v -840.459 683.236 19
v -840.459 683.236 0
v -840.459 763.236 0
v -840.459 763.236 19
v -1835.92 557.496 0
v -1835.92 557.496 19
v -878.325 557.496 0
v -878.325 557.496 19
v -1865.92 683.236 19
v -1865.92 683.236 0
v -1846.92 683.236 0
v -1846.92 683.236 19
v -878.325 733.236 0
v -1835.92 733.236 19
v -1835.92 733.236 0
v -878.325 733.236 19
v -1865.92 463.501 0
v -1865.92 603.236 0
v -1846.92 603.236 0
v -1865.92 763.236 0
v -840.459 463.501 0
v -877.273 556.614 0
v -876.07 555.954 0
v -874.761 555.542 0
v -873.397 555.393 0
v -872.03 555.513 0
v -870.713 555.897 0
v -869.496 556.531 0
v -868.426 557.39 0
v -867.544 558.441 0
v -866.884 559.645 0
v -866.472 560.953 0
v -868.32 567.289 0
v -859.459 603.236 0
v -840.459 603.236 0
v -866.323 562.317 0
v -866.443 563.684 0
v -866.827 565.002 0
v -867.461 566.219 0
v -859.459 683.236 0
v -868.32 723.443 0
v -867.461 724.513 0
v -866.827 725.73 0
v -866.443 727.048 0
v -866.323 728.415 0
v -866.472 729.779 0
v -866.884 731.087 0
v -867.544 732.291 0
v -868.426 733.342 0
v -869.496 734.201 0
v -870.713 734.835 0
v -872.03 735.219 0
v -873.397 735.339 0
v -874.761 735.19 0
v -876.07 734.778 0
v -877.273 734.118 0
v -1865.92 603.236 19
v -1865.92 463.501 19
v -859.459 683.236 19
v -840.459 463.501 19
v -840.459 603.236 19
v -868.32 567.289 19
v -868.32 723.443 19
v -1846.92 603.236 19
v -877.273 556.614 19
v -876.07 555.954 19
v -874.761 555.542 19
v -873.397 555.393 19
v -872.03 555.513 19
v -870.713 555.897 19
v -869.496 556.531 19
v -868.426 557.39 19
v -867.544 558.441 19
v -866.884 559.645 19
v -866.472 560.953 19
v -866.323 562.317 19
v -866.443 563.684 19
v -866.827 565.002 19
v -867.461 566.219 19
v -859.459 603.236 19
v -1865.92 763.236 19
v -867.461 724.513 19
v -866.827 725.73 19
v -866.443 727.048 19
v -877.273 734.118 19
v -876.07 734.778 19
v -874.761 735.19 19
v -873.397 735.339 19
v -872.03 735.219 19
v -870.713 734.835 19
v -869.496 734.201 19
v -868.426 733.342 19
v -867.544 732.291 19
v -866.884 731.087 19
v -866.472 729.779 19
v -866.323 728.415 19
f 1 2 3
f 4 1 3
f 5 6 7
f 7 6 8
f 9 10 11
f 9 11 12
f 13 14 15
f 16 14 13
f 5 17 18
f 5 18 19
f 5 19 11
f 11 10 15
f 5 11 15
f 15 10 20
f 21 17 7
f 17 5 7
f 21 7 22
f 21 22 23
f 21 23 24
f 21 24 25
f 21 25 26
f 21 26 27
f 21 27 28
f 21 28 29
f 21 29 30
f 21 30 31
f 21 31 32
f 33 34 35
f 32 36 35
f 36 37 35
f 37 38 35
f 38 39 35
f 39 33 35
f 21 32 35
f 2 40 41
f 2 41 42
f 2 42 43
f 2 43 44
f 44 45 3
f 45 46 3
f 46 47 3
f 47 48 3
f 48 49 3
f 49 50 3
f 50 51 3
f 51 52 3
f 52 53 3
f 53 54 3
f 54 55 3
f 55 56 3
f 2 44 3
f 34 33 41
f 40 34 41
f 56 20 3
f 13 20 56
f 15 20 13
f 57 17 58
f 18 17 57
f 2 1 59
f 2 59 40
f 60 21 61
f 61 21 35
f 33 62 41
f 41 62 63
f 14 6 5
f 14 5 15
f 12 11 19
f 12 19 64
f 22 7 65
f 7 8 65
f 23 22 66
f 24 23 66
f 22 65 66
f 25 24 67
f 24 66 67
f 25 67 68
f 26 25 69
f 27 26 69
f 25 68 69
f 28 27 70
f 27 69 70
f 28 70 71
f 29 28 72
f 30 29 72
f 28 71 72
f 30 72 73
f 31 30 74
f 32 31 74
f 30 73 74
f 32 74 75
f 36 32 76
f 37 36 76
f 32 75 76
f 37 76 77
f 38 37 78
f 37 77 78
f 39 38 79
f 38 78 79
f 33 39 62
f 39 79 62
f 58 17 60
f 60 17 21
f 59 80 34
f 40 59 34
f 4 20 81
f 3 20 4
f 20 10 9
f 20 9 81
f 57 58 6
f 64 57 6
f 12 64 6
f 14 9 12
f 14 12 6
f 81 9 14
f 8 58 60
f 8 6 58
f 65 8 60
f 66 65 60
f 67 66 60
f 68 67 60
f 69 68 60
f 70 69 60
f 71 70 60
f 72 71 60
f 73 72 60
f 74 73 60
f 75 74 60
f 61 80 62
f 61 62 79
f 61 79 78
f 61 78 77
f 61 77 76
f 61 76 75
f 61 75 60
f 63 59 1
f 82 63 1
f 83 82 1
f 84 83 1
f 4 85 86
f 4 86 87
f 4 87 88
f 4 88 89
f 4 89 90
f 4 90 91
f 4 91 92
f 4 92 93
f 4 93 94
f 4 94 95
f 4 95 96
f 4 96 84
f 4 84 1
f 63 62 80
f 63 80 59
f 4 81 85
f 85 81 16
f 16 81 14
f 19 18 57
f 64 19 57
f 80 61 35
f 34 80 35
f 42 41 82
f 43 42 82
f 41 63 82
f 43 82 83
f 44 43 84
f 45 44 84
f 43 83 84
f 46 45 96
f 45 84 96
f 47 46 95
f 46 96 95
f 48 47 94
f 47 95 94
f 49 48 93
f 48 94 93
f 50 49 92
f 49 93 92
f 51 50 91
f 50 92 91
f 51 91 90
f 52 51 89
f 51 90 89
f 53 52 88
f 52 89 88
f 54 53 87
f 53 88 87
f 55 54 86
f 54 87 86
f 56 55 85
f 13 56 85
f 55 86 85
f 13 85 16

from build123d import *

# Parameters (mm, degrees)
SKETCH1_W           = 1025.461280364
SKETCH1_H           = 299.73488768
BOSS_EXTRUDE1_DEPTH = 19
SKETCH2_W           = 967.6
SKETCH2_H           = 175.74
CUT_EXTRUDE1_DEPTH  = 19
SKETCH3_R           = 7
CUT_EXTRUDE2_DEPTH  = 19
SKETCH5_W           = 19
SKETCH5_H           = 80
CUT_EXTRUDE3_DEPTH  = 19
SKETCH6_W           = 19
SKETCH6_H           = 80
CUT_EXTRUDE4_DEPTH  = 19


with BuildPart() as part:
    # Sketch1 → Boss-Extrude1 (new body)
    with BuildSketch(Plane.XY):
        with Locations((-1353.189241506, 613.368537441)):
            Rectangle(SKETCH1_W, SKETCH1_H)
    extrude(amount=BOSS_EXTRUDE1_DEPTH)

    # Sketch2 → Cut-Extrude1 (cut)
    with BuildSketch(Plane.XY.offset(19)):
        with Locations((-1352.119881688, 645.365981281)):
            Rectangle(SKETCH2_W, SKETCH2_H)
    extrude(amount=-CUT_EXTRUDE1_DEPTH, mode=Mode.SUBTRACT)

    # Sketch3 → Cut-Extrude2 (cut)
    with BuildSketch(Plane.XY.offset(19)):
        with Locations((-873.322364856, 728.339537454)):
            Circle(SKETCH3_R)
        with Locations((-873.322364856, 562.392425108)):
            Circle(SKETCH3_R)
    extrude(amount=-CUT_EXTRUDE2_DEPTH, mode=Mode.SUBTRACT)

    # Sketch5 → Cut-Extrude3 (cut)
    with BuildSketch(Plane(origin=(-840.458601324, 0, 0), x_dir=(0, 0, -1), z_dir=(1, 0, 0))):
        with Locations((-9.5, 643.235981281)):
            Rectangle(SKETCH5_W, SKETCH5_H)
    extrude(amount=-CUT_EXTRUDE3_DEPTH, mode=Mode.SUBTRACT)

    # Sketch6 → Cut-Extrude4 (cut)
    with BuildSketch(Plane.ZY.offset(1865.919881688)):
        with Locations((9.5, 643.235981281)):
            Rectangle(SKETCH6_W, SKETCH6_H)
    extrude(amount=-CUT_EXTRUDE4_DEPTH, mode=Mode.SUBTRACT)


solid = part.part
